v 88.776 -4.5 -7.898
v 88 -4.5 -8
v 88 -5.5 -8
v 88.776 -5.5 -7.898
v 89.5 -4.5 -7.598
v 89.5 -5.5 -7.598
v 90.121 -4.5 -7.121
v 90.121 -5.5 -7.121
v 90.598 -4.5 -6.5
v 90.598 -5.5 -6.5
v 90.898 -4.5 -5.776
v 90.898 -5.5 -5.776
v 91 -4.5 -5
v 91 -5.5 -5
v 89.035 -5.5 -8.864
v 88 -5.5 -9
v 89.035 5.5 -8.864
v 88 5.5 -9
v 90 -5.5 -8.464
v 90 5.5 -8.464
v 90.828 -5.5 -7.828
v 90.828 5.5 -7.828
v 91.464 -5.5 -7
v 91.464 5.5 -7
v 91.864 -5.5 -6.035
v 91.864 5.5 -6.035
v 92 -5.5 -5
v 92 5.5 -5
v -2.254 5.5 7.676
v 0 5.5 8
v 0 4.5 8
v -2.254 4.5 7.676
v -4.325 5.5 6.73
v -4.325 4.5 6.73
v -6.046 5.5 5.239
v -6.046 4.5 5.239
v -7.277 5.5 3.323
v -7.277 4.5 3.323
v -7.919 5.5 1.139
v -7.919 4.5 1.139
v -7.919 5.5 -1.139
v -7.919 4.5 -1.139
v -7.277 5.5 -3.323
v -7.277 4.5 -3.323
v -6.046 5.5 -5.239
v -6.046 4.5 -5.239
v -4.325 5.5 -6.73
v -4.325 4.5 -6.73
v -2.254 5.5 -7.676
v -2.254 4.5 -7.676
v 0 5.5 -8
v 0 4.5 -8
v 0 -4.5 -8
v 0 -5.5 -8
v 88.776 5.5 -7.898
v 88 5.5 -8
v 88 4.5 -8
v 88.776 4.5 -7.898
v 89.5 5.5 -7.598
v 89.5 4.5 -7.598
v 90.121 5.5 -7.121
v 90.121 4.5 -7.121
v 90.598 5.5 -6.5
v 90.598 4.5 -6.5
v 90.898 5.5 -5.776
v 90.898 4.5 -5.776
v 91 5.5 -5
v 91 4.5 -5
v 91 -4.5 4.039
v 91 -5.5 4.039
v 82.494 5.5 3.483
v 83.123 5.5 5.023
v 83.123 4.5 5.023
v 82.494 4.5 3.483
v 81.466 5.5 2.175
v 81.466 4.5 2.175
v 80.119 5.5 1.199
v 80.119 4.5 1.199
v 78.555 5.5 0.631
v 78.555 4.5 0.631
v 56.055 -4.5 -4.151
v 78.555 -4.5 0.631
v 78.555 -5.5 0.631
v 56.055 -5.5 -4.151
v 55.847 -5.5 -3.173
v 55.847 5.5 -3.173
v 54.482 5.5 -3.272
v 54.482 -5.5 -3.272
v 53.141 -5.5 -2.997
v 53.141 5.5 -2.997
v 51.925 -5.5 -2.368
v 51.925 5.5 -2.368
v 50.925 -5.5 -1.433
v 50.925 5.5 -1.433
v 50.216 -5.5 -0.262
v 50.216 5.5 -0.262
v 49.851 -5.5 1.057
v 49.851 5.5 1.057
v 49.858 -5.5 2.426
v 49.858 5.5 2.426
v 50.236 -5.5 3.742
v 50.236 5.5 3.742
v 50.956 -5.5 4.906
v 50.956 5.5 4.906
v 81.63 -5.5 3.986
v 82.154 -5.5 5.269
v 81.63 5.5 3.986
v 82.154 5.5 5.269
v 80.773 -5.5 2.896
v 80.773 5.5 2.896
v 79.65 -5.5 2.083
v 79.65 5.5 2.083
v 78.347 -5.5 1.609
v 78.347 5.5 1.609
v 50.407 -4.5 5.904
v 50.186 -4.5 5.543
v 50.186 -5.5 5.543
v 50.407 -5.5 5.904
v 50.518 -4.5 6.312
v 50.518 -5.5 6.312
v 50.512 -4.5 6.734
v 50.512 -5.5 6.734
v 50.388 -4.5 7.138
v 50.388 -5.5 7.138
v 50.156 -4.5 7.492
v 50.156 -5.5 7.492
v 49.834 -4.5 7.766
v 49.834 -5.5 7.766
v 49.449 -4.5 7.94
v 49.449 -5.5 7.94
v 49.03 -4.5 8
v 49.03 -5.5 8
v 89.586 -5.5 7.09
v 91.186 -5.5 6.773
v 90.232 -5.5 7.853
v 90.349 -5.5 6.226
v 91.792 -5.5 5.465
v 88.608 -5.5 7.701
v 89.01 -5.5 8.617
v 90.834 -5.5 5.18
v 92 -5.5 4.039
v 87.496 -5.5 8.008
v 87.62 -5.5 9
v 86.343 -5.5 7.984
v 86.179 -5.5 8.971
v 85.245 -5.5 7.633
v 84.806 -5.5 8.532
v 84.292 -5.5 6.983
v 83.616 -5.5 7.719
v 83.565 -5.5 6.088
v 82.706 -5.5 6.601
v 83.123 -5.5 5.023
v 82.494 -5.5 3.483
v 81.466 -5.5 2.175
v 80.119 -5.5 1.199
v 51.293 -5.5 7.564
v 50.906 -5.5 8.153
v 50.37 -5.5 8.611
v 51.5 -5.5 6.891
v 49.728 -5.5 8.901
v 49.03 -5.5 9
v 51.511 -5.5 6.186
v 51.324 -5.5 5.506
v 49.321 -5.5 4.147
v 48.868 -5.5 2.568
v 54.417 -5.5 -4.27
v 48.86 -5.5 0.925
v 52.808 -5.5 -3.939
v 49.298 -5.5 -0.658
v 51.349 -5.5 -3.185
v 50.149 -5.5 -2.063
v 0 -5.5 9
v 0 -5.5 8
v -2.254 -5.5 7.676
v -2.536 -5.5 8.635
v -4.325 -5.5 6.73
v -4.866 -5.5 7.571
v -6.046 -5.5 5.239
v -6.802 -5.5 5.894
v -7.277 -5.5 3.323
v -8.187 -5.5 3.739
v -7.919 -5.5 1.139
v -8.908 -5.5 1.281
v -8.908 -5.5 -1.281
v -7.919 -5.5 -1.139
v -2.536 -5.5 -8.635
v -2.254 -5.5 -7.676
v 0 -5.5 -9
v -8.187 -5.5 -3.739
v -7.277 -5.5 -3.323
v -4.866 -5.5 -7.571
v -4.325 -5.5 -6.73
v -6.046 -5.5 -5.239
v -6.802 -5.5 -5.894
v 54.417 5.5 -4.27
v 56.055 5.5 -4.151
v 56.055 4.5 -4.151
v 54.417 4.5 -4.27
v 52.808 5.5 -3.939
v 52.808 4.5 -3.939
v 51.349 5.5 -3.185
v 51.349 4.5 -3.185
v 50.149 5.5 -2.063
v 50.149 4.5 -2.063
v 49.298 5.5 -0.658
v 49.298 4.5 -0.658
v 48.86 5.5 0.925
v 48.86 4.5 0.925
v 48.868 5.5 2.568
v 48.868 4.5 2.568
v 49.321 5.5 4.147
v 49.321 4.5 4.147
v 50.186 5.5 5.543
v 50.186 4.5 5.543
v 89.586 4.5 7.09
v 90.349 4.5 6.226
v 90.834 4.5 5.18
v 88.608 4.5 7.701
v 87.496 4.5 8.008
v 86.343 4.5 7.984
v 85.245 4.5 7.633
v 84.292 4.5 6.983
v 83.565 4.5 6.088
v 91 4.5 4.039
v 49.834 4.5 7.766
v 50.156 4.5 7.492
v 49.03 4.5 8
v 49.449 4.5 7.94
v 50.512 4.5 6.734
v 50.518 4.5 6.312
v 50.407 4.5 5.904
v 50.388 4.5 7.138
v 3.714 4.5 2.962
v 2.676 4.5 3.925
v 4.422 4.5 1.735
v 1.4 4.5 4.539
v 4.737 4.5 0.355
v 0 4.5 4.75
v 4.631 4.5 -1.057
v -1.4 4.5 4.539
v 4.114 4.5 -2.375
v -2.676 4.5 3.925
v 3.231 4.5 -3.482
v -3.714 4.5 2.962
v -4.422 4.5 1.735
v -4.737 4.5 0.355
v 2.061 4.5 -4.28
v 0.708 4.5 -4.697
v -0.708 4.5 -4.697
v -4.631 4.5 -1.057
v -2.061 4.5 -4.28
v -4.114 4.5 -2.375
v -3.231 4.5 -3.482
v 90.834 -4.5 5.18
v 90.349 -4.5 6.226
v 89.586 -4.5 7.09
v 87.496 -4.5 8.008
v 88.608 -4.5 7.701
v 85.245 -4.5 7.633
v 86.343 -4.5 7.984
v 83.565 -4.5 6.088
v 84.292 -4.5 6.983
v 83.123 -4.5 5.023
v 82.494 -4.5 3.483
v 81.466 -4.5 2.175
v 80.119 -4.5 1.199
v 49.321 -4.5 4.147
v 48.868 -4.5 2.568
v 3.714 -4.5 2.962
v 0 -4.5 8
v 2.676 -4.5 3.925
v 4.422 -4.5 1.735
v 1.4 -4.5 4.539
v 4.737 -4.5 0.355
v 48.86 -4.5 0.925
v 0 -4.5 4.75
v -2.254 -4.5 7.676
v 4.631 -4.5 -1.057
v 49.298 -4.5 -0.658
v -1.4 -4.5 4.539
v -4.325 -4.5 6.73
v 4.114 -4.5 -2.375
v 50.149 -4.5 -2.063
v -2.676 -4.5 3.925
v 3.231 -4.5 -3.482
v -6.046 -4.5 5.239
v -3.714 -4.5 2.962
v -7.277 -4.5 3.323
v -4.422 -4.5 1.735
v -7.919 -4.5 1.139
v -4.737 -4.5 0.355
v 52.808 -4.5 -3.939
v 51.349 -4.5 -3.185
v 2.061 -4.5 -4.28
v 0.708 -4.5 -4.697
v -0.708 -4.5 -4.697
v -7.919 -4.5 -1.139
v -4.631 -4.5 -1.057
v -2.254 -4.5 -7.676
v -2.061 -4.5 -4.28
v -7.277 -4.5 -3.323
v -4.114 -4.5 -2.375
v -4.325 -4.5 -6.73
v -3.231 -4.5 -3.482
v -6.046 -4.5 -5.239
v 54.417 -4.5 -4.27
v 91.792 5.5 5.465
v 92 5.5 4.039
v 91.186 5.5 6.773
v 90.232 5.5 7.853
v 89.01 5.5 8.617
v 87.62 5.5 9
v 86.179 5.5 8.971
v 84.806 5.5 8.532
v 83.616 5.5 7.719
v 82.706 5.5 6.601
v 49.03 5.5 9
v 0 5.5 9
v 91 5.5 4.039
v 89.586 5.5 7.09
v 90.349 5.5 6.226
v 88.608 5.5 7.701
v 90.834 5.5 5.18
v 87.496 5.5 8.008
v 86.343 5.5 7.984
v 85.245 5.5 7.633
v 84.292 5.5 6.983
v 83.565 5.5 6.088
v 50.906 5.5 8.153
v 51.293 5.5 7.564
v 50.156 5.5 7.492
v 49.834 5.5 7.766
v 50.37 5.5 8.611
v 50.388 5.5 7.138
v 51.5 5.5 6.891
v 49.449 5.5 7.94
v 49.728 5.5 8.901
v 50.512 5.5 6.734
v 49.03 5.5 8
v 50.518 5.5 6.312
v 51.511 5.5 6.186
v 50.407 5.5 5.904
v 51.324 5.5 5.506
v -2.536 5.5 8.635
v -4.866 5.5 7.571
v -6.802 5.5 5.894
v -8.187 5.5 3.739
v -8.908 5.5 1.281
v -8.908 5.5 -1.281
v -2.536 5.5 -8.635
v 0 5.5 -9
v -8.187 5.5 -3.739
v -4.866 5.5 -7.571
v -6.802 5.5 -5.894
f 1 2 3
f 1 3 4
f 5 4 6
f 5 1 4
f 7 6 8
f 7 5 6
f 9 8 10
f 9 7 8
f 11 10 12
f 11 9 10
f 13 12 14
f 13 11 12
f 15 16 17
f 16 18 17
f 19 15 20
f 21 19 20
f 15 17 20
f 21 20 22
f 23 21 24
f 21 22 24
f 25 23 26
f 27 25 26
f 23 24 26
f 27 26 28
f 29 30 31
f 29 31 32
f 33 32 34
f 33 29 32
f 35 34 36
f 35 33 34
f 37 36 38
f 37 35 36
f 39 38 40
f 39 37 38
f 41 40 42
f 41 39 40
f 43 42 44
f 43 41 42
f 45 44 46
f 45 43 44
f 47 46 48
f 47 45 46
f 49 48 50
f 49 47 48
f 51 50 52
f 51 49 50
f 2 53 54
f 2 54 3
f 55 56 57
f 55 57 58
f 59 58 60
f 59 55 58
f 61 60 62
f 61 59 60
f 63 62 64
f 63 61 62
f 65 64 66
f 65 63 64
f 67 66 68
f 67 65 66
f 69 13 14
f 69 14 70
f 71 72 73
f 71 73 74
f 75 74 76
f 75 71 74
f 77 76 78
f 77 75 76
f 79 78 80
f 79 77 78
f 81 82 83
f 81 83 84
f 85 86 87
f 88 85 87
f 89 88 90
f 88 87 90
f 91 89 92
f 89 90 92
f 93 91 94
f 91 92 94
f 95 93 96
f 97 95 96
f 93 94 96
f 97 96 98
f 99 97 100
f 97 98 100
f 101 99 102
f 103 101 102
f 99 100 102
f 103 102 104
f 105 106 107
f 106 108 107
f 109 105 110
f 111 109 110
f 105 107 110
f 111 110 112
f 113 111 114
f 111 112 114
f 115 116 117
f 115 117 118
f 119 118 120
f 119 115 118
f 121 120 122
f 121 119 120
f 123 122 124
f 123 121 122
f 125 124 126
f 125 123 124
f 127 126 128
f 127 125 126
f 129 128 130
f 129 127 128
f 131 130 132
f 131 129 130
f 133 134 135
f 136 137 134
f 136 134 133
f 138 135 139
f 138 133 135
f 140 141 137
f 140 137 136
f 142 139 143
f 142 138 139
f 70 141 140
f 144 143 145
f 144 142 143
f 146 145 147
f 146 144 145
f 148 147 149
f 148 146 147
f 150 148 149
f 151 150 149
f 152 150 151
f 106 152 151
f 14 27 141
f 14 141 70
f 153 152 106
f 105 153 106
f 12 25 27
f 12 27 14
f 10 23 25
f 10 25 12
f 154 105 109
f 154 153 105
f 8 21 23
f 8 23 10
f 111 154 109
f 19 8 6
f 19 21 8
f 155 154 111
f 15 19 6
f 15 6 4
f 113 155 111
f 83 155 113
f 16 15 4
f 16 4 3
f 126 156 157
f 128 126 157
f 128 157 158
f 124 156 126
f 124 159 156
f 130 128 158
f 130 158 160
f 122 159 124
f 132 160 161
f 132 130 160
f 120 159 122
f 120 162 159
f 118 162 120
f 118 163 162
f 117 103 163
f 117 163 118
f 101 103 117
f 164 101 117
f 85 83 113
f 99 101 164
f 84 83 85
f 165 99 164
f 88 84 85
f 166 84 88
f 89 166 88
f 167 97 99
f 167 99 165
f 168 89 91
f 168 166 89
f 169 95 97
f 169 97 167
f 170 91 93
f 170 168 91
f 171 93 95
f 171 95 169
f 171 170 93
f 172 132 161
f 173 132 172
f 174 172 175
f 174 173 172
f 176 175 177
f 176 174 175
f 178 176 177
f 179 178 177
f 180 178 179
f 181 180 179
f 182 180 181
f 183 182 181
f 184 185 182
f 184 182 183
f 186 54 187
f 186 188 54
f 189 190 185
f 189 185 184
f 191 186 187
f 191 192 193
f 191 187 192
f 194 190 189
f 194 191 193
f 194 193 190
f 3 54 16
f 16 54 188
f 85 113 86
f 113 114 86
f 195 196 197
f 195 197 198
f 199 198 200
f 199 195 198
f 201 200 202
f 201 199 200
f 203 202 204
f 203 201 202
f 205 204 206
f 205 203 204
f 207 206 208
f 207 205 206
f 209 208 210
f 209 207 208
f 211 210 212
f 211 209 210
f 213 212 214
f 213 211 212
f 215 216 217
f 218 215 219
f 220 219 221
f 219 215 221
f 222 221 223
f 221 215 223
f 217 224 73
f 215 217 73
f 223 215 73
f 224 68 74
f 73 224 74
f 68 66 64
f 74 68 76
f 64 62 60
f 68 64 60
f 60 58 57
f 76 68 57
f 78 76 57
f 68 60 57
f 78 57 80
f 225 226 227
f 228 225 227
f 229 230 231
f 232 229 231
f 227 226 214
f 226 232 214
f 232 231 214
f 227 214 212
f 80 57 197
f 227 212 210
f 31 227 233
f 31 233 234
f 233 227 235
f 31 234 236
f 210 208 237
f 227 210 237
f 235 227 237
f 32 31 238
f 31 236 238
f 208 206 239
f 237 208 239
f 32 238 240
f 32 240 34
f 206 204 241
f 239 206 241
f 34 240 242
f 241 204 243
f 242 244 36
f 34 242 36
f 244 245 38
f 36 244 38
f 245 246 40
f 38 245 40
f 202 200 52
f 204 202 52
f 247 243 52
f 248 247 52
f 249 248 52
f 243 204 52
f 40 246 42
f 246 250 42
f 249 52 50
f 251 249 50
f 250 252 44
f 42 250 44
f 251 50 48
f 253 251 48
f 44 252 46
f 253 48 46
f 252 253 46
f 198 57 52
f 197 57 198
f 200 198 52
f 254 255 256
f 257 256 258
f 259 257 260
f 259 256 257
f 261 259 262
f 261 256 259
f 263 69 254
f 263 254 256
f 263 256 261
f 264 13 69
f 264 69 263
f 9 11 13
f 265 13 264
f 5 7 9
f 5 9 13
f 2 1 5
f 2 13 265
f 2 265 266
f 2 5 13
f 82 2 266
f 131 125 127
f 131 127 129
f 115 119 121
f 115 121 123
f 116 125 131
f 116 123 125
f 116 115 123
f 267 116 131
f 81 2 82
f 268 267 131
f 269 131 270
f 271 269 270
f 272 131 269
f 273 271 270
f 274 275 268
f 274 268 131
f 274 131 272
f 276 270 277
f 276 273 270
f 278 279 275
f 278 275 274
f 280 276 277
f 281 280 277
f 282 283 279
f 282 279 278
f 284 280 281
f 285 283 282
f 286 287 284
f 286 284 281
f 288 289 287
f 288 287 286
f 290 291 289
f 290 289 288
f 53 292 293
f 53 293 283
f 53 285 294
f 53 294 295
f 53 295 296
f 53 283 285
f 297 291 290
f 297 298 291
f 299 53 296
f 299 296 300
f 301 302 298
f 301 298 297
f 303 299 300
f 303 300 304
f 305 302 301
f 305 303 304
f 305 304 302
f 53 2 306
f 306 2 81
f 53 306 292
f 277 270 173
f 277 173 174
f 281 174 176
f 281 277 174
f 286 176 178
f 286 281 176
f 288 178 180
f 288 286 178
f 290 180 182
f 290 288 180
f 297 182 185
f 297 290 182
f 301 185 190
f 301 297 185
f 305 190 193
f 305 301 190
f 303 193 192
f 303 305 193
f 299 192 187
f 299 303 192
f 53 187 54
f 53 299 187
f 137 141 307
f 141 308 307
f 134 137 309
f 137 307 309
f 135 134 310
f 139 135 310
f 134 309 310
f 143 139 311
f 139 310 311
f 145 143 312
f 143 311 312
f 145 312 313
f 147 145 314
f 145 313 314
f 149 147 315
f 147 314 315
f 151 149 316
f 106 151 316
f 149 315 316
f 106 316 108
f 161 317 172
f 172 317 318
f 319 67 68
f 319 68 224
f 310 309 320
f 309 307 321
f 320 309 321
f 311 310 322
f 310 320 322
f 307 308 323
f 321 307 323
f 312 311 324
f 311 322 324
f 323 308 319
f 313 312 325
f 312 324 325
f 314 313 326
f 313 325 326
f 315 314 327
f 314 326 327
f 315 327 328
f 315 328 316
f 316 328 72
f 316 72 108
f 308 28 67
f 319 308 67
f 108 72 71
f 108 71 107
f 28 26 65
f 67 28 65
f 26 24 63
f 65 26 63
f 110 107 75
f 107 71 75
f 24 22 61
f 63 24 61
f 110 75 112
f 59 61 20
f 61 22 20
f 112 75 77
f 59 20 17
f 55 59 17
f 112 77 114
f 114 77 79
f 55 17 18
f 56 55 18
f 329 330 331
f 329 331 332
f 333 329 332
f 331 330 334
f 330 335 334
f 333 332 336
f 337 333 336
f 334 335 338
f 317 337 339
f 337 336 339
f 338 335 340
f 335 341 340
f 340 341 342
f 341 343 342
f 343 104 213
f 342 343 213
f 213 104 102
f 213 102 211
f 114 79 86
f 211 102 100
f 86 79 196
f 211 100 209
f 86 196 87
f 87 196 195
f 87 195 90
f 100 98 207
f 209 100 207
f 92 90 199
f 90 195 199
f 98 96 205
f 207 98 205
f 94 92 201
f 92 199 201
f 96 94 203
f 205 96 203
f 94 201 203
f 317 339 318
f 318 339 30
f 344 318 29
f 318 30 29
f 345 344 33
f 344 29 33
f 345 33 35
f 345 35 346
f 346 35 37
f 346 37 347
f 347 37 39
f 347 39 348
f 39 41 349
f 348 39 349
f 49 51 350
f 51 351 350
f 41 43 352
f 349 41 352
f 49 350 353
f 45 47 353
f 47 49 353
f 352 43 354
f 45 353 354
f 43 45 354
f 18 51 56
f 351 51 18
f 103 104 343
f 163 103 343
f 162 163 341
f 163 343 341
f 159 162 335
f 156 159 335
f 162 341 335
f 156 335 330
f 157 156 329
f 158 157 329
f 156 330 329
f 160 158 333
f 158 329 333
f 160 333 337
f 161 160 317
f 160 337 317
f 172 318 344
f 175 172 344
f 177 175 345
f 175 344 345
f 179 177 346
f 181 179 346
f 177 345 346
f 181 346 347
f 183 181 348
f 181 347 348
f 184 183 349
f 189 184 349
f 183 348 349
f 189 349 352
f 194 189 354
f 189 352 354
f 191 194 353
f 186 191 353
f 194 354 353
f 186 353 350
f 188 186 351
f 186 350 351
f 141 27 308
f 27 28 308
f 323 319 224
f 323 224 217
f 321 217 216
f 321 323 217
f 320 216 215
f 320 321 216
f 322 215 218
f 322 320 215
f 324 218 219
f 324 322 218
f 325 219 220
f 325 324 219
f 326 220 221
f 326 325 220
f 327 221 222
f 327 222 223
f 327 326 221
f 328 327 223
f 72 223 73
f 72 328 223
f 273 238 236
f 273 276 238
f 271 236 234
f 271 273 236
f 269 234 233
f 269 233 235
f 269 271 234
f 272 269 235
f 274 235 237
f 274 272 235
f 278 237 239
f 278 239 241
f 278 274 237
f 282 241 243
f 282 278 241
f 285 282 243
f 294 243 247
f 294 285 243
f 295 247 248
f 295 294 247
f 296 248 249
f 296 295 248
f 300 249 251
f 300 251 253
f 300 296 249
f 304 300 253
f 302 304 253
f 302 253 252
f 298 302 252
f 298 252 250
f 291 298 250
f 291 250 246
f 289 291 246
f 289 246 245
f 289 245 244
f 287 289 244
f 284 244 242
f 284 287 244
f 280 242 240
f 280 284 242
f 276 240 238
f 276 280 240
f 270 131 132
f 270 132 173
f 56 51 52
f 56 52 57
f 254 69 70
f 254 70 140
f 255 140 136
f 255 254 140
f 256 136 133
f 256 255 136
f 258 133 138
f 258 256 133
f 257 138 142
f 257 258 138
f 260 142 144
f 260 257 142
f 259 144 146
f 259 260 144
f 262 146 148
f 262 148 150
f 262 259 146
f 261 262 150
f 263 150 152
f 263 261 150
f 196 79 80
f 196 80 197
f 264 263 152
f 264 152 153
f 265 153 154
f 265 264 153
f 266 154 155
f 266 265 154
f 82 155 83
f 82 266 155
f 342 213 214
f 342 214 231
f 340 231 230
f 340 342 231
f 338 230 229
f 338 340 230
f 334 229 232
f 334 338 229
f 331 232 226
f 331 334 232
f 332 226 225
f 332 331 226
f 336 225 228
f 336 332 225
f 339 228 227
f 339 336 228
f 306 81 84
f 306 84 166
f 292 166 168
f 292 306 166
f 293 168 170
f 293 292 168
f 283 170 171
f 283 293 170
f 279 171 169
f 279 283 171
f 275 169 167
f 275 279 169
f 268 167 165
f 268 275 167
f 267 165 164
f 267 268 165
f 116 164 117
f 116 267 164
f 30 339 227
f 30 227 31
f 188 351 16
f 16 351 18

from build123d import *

# Parameters (mm, degrees)
BOSS_EXTRUDE1_DEPTH = 5.5
SKETCH2_3_R         = 4.75
BOSS_EXTRUDE2_DEPTH = 4.5


with BuildPart() as part:
    # Sketch2 → Boss-Extrude1 (new, symmetric)
    with BuildSketch(Plane(origin=(0, 0, 0), x_dir=(1, 0, 0), z_dir=(0, 1, 0))):
        with BuildLine():
            Line((0, 9), (88, 9))
            ThreePointArc((88, 9), (90.828427125, 7.828427125), (92, 5))
            Line((92, 5), (92, -4.038605995))
            ThreePointArc((92, -4.038605995), (87.6201367, -9), (82.153827811, -5.269302997))
            ThreePointArc((82.153827811, -5.269302997), (80.773118265, -2.895756853), (78.347214076, -1.609261996))
            Line((78.347214076, -1.609261996), (55.847214076, 3.173260641))
            ThreePointArc((55.847214076, 3.173260641), (50.53042136, 0.871975682), (50.956106022, -4.905825787))
            ThreePointArc((50.956106022, -4.905825787), (51.292568558, -7.564087513), (49.030331222, -9))
            Line((49.030331222, -9), (0, -9))
            ThreePointArc((0, -9), (-9, 0), (0, 9))
        make_face()
        with BuildLine():
            Line((0, 8), (88, 8))
            ThreePointArc((88, 8), (90.121320344, 7.121320344), (91, 5))
            Line((91, 5), (91, -4.038605995))
            ThreePointArc((91, -4.038605995), (87.49610936, -8.007721199), (83.123062249, -5.023163597))
            ThreePointArc((83.123062249, -5.023163597), (81.466210794, -2.174908223), (78.555125766, -0.631114396))
            Line((78.555125766, -0.631114396), (56.055125766, 4.151408242))
            ThreePointArc((56.055125766, 4.151408242), (49.674974507, 1.389866291), (50.185796102, -5.543495472))
            ThreePointArc((50.185796102, -5.543495472), (50.387673623, -7.138452508), (49.030331222, -8))
            Line((49.030331222, -8), (0, -8))
            ThreePointArc((0, -8), (-8, 0), (0, 8))
        make_face(mode=Mode.SUBTRACT)
    extrude(amount=BOSS_EXTRUDE1_DEPTH, both=True)

    # Sketch2<3> → Boss-Extrude2 (add, symmetric)
    with BuildSketch(Plane(origin=(0, 0, 0), x_dir=(1, 0, 0), z_dir=(0, 1, 0))):
        with BuildLine():
            Line((88, 8), (0, 8))
            ThreePointArc((0, 8), (-8, 0), (0, -8))
            Line((0, -8), (49.030331222, -8))
            ThreePointArc((49.030331222, -8), (50.387673623, -7.138452508), (50.185796102, -5.543495472))
            ThreePointArc((50.185796102, -5.543495472), (49.674974507, 1.389866291), (56.055125766, 4.151408242))
            Line((56.055125766, 4.151408242), (78.555125766, -0.631114396))
            ThreePointArc((78.555125766, -0.631114396), (81.466210794, -2.174908223), (83.123062249, -5.023163597))
            ThreePointArc((83.123062249, -5.023163597), (87.49610936, -8.007721199), (91, -4.038605995))
            Line((91, -4.038605995), (91, 5))
            ThreePointArc((91, 5), (90.121320344, 7.121320344), (88, 8))
        make_face()
        Circle(SKETCH2_3_R, mode=Mode.SUBTRACT)
    extrude(amount=BOSS_EXTRUDE2_DEPTH, both=True)


solid = part.part
